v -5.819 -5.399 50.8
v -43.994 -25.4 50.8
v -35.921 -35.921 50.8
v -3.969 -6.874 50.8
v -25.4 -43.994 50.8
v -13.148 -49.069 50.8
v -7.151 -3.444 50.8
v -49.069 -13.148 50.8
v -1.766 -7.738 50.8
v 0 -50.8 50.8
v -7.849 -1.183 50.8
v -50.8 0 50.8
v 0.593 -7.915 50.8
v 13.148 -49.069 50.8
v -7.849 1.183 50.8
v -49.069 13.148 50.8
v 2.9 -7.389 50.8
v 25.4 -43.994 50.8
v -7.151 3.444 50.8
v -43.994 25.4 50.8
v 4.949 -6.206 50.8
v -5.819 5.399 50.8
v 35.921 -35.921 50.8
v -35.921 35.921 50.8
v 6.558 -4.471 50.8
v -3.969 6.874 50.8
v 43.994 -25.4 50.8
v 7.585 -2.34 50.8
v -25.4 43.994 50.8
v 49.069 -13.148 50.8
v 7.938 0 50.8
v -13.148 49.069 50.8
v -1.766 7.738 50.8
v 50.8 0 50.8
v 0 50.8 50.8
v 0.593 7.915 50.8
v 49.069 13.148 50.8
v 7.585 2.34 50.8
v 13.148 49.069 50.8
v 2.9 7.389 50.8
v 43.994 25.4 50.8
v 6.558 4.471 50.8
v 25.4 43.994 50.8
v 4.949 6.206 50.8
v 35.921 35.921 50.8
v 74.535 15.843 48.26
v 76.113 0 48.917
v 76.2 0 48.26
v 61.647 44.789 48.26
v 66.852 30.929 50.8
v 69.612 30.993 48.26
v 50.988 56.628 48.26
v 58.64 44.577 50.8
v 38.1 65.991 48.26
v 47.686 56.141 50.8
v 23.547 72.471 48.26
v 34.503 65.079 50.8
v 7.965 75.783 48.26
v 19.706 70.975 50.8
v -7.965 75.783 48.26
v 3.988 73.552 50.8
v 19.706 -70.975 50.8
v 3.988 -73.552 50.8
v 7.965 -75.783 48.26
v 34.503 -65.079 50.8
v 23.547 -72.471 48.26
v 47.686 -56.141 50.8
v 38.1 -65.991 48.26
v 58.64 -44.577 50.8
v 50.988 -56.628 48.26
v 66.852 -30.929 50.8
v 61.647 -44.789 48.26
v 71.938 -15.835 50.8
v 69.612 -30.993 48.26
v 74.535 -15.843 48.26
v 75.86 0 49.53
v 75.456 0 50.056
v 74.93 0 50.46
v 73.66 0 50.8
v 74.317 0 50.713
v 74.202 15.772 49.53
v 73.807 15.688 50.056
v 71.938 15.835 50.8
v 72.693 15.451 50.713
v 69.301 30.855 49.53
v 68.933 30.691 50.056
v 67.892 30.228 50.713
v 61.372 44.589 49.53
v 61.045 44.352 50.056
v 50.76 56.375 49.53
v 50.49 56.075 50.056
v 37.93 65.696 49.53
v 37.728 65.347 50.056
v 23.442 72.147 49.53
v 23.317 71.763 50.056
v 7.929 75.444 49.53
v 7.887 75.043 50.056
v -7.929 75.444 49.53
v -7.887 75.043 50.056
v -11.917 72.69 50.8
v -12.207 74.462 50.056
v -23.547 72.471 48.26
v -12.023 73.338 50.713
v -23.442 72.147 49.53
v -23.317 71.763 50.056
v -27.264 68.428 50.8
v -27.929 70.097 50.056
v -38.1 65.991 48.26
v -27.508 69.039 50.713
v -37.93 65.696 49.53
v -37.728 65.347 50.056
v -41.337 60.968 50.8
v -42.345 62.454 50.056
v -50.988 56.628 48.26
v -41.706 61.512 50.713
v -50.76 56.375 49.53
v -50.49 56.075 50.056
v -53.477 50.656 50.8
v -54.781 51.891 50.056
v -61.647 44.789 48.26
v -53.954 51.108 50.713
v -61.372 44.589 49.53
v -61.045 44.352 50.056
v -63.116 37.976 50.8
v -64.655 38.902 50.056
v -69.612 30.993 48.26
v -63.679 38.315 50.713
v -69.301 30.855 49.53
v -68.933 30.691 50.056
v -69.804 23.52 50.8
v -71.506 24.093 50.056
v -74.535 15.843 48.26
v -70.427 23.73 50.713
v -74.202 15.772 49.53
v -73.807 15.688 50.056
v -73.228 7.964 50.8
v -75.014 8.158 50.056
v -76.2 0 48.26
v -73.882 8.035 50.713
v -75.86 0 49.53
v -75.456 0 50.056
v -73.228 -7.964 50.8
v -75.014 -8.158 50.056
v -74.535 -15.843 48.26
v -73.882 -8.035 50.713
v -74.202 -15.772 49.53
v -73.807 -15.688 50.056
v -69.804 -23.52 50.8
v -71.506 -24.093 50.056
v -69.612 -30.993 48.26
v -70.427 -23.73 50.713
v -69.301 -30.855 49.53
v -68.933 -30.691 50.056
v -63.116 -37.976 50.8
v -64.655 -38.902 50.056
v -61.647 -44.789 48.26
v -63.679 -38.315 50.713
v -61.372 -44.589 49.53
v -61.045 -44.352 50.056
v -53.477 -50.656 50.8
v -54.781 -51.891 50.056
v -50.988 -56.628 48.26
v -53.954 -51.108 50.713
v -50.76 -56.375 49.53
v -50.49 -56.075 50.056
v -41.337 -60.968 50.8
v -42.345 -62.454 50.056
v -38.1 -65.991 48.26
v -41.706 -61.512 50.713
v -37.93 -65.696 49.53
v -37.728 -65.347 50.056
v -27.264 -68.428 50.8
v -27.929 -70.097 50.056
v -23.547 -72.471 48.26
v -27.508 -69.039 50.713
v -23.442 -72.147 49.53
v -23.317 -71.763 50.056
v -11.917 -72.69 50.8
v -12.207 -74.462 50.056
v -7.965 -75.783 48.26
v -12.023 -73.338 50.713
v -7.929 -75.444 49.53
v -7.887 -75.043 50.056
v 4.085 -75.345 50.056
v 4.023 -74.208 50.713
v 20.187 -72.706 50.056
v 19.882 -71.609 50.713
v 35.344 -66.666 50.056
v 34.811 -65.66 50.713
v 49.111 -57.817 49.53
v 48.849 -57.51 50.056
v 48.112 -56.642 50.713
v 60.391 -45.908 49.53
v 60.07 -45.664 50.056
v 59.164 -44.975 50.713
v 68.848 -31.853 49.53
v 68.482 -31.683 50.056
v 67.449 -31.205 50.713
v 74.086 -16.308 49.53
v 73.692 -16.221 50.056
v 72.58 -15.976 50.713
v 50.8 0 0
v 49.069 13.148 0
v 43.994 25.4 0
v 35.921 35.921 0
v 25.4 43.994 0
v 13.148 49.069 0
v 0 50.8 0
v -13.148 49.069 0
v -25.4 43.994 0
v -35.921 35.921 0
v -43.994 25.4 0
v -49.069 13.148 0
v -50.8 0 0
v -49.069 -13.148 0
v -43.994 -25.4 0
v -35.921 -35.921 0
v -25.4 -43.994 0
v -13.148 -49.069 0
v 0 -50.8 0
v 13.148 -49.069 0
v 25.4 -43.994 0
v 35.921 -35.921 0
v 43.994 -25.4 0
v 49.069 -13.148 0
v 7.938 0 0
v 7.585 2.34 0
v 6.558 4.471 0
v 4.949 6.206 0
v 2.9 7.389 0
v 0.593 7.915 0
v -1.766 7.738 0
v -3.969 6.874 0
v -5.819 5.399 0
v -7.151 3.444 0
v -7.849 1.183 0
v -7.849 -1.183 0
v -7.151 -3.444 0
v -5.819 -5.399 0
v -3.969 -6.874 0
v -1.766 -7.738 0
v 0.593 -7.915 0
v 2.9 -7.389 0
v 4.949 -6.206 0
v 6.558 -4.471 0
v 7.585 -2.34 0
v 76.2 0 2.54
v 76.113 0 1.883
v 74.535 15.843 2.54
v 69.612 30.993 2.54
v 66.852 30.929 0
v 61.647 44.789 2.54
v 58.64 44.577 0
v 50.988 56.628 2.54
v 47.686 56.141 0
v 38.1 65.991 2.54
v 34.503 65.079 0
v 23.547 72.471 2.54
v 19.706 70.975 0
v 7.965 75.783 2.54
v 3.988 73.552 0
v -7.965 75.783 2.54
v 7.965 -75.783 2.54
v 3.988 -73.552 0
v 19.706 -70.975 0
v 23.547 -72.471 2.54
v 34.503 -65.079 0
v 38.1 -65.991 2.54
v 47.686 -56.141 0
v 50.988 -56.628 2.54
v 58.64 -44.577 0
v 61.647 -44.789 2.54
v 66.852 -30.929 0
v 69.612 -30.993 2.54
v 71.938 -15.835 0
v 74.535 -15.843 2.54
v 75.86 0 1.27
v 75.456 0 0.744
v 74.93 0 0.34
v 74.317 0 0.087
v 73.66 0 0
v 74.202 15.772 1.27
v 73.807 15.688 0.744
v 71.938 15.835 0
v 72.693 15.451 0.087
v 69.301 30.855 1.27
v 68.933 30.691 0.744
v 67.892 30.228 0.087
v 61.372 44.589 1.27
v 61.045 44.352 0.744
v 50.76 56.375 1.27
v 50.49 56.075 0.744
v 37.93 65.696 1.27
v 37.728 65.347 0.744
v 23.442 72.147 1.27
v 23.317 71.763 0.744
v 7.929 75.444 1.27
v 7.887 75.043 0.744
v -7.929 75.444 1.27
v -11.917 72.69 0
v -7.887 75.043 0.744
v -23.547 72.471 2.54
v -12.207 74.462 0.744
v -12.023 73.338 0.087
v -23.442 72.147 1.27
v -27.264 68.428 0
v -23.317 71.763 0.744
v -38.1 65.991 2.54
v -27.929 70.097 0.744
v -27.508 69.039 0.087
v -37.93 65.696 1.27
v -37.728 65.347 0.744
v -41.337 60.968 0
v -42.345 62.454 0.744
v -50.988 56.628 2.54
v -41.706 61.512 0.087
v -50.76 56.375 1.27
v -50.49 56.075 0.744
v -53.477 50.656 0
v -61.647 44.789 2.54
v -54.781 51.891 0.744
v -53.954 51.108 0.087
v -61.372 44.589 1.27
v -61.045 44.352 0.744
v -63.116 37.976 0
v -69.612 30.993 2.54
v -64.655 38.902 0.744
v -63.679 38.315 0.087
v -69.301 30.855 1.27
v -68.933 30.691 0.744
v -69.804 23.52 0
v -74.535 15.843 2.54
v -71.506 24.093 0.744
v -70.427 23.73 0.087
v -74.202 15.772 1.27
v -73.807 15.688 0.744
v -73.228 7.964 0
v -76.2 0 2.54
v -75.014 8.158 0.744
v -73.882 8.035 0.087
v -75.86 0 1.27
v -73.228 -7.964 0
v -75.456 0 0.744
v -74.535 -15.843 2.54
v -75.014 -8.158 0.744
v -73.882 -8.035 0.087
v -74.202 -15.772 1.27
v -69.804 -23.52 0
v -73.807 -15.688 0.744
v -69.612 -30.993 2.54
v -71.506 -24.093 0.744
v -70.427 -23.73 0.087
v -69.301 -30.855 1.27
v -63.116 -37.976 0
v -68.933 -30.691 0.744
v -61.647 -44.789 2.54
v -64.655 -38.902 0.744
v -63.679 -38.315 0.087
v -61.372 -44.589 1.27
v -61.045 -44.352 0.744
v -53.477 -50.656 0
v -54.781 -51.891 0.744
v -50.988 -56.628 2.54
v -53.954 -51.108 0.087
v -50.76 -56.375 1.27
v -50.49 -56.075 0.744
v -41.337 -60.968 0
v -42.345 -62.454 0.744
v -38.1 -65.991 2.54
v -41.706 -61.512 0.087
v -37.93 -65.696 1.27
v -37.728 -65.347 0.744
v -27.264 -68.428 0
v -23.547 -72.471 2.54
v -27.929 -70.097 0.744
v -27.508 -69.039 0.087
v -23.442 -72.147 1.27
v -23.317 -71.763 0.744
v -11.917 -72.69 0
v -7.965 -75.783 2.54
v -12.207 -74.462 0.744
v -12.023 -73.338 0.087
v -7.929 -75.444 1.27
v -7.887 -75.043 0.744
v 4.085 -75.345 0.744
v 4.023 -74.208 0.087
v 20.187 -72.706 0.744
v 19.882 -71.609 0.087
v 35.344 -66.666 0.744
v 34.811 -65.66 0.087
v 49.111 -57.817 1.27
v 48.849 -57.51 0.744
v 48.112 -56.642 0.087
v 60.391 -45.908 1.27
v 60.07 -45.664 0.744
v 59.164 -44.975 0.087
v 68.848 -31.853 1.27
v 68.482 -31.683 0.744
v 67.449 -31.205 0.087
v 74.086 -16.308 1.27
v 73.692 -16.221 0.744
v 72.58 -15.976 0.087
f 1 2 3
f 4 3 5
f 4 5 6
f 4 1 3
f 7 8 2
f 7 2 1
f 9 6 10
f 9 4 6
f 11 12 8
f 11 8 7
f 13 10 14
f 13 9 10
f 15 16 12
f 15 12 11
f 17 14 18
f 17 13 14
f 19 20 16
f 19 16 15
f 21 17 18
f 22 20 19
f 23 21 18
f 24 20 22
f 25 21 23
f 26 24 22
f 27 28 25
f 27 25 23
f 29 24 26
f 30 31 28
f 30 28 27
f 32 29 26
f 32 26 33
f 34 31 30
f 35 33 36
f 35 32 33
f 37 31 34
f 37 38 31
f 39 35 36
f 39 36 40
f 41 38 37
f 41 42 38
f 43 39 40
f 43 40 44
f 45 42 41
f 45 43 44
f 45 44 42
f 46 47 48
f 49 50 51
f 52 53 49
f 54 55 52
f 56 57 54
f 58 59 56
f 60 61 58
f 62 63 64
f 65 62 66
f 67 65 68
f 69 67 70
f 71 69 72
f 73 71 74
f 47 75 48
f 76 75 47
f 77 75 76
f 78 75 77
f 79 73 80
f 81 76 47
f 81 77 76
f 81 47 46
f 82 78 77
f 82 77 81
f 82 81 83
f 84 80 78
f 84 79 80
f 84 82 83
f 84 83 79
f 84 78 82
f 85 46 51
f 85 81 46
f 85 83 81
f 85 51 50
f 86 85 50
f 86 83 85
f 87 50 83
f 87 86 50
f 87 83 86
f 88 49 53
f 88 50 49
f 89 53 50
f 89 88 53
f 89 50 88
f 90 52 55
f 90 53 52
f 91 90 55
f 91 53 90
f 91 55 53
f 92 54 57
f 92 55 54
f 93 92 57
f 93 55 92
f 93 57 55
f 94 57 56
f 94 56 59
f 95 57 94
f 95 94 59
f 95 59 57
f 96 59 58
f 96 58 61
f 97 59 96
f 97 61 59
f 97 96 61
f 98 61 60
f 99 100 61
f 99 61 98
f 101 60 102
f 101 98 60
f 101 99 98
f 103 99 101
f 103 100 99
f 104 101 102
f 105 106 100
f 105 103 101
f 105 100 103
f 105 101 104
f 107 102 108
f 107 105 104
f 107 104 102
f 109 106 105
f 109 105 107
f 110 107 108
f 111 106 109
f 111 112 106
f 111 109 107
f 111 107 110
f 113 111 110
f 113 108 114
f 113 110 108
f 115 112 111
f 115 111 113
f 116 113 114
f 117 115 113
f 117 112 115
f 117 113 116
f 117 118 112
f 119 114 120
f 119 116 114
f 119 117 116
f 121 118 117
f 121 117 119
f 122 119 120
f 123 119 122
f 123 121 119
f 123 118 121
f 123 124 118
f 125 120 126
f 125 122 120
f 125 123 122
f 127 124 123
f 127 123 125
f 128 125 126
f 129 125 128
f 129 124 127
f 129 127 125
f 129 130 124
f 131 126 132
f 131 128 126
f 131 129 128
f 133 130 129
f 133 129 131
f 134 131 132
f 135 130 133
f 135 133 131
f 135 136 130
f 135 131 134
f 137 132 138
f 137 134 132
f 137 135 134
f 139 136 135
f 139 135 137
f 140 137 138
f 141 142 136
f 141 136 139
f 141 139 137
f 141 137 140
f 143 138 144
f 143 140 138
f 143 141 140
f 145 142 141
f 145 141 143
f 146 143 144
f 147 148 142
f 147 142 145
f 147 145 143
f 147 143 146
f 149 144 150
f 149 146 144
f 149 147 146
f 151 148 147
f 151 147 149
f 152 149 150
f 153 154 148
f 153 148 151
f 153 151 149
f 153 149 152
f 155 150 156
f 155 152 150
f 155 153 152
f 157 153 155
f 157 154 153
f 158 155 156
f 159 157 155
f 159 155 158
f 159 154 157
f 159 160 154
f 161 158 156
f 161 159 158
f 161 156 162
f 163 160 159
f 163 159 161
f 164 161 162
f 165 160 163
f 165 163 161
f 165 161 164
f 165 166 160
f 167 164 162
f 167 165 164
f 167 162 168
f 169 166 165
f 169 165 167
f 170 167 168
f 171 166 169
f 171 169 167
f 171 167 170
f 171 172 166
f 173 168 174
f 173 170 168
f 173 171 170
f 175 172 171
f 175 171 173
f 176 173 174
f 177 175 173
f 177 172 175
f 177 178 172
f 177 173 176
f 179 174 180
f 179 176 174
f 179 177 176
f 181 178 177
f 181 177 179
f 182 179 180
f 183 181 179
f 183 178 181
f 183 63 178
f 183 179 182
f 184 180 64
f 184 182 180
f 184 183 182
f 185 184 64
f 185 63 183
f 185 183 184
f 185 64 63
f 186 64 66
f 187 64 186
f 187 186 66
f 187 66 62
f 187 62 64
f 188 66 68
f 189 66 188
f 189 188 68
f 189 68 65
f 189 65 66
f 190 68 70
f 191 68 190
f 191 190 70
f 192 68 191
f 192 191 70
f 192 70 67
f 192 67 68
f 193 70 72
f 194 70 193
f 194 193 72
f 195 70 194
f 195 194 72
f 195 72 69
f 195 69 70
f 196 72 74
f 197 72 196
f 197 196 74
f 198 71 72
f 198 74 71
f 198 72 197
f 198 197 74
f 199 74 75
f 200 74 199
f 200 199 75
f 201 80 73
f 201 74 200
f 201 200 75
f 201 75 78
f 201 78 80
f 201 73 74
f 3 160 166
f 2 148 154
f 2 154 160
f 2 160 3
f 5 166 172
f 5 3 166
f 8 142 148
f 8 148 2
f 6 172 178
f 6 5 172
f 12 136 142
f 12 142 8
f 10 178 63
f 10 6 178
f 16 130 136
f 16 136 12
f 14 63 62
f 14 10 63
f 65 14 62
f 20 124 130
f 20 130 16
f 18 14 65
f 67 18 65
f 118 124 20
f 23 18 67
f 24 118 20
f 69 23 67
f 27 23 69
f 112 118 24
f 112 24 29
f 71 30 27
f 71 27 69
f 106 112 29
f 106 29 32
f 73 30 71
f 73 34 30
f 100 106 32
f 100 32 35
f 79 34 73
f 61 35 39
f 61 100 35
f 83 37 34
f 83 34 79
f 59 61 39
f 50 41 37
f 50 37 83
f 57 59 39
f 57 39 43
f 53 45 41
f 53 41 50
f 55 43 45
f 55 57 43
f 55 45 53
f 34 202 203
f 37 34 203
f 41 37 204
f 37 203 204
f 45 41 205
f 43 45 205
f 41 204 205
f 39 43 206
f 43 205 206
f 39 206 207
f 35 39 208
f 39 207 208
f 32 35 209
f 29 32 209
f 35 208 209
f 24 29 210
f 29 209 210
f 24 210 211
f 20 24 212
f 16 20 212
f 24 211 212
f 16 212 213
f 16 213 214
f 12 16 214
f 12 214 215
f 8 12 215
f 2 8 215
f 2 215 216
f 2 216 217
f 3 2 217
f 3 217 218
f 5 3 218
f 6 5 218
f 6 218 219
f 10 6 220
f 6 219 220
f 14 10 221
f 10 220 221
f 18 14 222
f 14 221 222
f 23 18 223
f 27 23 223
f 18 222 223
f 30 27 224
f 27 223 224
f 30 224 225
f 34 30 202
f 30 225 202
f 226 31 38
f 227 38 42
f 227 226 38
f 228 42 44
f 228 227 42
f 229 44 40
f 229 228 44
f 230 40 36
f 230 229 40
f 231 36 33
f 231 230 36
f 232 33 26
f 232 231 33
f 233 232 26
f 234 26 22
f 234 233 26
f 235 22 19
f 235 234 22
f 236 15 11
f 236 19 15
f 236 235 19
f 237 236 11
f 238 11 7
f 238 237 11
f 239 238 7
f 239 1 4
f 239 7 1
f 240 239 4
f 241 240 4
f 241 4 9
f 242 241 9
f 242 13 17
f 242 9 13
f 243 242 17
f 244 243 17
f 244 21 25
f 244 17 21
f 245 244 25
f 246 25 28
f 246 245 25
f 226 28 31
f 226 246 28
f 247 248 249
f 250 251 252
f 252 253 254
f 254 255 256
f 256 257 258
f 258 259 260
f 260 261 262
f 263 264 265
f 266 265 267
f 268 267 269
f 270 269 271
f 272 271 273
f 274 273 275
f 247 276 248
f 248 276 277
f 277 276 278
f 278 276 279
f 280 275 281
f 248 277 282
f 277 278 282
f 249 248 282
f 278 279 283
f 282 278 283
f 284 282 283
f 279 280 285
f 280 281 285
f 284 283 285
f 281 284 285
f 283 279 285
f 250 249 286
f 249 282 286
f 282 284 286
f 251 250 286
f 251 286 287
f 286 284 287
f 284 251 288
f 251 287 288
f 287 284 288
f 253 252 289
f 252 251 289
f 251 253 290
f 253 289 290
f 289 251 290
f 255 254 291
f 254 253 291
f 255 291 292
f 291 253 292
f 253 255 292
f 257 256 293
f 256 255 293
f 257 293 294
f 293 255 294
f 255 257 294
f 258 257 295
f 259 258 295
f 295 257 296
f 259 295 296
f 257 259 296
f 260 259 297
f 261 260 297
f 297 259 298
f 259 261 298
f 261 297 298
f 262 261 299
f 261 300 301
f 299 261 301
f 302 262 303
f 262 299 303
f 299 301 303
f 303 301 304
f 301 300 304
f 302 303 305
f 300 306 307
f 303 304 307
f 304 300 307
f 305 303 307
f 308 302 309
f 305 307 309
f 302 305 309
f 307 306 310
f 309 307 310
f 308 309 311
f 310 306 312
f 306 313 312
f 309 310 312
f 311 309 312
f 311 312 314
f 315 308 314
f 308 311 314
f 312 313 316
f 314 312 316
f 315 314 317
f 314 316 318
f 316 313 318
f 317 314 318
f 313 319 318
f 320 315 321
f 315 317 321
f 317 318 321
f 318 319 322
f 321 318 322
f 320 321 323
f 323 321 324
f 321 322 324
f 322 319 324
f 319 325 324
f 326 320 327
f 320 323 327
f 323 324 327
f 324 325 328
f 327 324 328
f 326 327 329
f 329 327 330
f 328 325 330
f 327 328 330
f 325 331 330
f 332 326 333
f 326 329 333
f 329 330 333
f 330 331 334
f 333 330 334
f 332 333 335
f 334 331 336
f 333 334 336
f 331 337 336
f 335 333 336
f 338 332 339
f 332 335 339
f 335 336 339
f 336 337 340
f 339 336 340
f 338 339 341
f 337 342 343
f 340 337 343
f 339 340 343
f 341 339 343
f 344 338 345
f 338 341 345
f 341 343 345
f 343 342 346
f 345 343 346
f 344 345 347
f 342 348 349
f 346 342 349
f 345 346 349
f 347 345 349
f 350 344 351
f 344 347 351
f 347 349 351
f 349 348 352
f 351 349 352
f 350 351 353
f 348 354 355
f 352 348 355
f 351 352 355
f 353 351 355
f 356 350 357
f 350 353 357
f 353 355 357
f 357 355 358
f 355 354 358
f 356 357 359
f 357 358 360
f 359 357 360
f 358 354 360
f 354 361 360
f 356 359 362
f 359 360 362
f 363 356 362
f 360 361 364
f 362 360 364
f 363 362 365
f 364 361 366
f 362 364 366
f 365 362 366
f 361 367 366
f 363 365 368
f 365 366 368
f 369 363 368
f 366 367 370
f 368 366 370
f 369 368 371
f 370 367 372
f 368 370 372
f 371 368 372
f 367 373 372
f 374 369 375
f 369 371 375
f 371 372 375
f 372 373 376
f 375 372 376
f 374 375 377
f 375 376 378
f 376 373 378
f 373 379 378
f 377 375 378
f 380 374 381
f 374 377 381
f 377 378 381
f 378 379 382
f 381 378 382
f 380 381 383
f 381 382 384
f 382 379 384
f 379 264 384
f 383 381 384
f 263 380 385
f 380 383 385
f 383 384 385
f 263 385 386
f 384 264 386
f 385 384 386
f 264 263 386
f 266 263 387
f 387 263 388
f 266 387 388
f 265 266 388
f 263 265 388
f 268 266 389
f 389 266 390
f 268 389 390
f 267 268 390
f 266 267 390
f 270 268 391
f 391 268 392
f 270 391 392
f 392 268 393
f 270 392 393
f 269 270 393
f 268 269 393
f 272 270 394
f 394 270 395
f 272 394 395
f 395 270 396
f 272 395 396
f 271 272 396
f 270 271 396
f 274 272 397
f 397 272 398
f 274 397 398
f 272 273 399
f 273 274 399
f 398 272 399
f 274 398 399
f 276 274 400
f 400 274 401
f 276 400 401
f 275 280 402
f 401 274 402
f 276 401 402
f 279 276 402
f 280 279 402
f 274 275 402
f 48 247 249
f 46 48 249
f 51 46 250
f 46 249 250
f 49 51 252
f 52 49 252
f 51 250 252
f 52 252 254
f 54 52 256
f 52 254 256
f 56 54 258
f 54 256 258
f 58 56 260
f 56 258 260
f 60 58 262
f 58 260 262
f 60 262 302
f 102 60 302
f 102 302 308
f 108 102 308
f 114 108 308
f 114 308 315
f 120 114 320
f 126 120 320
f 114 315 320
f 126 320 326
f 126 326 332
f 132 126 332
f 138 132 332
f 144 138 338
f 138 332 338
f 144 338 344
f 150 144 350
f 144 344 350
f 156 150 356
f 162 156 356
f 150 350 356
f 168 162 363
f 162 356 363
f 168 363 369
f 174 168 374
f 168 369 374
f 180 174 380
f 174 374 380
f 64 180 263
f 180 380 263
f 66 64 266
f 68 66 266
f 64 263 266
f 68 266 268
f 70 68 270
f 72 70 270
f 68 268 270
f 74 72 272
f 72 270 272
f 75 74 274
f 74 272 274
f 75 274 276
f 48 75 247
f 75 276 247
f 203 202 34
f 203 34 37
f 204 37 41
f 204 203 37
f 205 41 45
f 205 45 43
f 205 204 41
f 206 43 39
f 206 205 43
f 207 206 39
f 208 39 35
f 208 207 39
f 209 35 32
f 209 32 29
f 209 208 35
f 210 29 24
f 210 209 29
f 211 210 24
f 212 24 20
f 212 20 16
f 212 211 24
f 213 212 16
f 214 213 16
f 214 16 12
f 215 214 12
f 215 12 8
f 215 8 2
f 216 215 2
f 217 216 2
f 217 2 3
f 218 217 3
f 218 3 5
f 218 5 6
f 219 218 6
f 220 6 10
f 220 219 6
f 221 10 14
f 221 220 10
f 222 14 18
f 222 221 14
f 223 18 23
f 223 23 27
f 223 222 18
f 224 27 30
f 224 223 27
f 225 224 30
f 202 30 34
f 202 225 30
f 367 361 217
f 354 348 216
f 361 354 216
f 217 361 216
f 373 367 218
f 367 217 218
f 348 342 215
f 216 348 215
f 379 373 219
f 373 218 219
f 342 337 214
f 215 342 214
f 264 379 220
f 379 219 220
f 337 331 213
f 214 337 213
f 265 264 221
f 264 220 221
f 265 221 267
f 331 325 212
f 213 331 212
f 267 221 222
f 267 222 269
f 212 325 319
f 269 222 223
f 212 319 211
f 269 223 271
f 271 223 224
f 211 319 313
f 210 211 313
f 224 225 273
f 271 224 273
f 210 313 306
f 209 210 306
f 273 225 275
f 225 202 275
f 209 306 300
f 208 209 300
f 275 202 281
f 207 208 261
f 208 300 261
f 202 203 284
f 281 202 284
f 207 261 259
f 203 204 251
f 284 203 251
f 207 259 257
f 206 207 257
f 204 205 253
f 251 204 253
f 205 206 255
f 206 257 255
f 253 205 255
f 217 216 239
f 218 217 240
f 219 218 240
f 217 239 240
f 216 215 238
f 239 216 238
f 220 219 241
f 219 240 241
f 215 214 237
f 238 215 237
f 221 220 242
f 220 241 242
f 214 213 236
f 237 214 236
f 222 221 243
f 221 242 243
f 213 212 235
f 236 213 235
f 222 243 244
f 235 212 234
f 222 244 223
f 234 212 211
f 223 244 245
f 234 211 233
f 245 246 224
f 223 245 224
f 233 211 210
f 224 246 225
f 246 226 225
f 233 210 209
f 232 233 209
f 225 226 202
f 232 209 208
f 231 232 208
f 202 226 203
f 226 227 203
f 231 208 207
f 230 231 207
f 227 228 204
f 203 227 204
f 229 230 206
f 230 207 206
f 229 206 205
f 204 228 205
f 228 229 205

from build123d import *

# Parameters (mm, degrees)
SKETCH1_R           = 50.8
BOSS_EXTRUDE1_DEPTH = 50.8
SKETCH2_R           = 7.9375
CUT_EXTRUDE1_DEPTH  = 88.988181024
SKETCH3_R           = 76.2
SKETCH3_R_2         = 50.8
BOSS_EXTRUDE2_DEPTH = 50.8
FILLET1_R           = 2.54


with BuildPart() as part:
    # Sketch1 → Boss-Extrude1 (new body)
    with BuildSketch(Plane.XY):
        Circle(SKETCH1_R)
    extrude(amount=BOSS_EXTRUDE1_DEPTH)

    # Sketch2 → Cut-Extrude1 (cut, through all)
    with BuildSketch(Plane.XY):
        Circle(SKETCH2_R)
    extrude(amount=CUT_EXTRUDE1_DEPTH, mode=Mode.SUBTRACT)


with BuildPart() as body_2:
    # Sketch3 → Boss-Extrude2 (new body)
    with BuildSketch(Plane.XY):
        Circle(SKETCH3_R)
        Circle(SKETCH3_R_2, mode=Mode.SUBTRACT)
    extrude(amount=BOSS_EXTRUDE2_DEPTH)

    # Fillet1
    fillet1_edges = [body_2.edges().sort_by_distance(p)[0] for p in [
        (-76.2, 0, 50.8),
        (-76.2, 0, 0),
    ]]
    fillet(fillet1_edges, radius=FILLET1_R)


solid = Compound([part.part, body_2.part])
